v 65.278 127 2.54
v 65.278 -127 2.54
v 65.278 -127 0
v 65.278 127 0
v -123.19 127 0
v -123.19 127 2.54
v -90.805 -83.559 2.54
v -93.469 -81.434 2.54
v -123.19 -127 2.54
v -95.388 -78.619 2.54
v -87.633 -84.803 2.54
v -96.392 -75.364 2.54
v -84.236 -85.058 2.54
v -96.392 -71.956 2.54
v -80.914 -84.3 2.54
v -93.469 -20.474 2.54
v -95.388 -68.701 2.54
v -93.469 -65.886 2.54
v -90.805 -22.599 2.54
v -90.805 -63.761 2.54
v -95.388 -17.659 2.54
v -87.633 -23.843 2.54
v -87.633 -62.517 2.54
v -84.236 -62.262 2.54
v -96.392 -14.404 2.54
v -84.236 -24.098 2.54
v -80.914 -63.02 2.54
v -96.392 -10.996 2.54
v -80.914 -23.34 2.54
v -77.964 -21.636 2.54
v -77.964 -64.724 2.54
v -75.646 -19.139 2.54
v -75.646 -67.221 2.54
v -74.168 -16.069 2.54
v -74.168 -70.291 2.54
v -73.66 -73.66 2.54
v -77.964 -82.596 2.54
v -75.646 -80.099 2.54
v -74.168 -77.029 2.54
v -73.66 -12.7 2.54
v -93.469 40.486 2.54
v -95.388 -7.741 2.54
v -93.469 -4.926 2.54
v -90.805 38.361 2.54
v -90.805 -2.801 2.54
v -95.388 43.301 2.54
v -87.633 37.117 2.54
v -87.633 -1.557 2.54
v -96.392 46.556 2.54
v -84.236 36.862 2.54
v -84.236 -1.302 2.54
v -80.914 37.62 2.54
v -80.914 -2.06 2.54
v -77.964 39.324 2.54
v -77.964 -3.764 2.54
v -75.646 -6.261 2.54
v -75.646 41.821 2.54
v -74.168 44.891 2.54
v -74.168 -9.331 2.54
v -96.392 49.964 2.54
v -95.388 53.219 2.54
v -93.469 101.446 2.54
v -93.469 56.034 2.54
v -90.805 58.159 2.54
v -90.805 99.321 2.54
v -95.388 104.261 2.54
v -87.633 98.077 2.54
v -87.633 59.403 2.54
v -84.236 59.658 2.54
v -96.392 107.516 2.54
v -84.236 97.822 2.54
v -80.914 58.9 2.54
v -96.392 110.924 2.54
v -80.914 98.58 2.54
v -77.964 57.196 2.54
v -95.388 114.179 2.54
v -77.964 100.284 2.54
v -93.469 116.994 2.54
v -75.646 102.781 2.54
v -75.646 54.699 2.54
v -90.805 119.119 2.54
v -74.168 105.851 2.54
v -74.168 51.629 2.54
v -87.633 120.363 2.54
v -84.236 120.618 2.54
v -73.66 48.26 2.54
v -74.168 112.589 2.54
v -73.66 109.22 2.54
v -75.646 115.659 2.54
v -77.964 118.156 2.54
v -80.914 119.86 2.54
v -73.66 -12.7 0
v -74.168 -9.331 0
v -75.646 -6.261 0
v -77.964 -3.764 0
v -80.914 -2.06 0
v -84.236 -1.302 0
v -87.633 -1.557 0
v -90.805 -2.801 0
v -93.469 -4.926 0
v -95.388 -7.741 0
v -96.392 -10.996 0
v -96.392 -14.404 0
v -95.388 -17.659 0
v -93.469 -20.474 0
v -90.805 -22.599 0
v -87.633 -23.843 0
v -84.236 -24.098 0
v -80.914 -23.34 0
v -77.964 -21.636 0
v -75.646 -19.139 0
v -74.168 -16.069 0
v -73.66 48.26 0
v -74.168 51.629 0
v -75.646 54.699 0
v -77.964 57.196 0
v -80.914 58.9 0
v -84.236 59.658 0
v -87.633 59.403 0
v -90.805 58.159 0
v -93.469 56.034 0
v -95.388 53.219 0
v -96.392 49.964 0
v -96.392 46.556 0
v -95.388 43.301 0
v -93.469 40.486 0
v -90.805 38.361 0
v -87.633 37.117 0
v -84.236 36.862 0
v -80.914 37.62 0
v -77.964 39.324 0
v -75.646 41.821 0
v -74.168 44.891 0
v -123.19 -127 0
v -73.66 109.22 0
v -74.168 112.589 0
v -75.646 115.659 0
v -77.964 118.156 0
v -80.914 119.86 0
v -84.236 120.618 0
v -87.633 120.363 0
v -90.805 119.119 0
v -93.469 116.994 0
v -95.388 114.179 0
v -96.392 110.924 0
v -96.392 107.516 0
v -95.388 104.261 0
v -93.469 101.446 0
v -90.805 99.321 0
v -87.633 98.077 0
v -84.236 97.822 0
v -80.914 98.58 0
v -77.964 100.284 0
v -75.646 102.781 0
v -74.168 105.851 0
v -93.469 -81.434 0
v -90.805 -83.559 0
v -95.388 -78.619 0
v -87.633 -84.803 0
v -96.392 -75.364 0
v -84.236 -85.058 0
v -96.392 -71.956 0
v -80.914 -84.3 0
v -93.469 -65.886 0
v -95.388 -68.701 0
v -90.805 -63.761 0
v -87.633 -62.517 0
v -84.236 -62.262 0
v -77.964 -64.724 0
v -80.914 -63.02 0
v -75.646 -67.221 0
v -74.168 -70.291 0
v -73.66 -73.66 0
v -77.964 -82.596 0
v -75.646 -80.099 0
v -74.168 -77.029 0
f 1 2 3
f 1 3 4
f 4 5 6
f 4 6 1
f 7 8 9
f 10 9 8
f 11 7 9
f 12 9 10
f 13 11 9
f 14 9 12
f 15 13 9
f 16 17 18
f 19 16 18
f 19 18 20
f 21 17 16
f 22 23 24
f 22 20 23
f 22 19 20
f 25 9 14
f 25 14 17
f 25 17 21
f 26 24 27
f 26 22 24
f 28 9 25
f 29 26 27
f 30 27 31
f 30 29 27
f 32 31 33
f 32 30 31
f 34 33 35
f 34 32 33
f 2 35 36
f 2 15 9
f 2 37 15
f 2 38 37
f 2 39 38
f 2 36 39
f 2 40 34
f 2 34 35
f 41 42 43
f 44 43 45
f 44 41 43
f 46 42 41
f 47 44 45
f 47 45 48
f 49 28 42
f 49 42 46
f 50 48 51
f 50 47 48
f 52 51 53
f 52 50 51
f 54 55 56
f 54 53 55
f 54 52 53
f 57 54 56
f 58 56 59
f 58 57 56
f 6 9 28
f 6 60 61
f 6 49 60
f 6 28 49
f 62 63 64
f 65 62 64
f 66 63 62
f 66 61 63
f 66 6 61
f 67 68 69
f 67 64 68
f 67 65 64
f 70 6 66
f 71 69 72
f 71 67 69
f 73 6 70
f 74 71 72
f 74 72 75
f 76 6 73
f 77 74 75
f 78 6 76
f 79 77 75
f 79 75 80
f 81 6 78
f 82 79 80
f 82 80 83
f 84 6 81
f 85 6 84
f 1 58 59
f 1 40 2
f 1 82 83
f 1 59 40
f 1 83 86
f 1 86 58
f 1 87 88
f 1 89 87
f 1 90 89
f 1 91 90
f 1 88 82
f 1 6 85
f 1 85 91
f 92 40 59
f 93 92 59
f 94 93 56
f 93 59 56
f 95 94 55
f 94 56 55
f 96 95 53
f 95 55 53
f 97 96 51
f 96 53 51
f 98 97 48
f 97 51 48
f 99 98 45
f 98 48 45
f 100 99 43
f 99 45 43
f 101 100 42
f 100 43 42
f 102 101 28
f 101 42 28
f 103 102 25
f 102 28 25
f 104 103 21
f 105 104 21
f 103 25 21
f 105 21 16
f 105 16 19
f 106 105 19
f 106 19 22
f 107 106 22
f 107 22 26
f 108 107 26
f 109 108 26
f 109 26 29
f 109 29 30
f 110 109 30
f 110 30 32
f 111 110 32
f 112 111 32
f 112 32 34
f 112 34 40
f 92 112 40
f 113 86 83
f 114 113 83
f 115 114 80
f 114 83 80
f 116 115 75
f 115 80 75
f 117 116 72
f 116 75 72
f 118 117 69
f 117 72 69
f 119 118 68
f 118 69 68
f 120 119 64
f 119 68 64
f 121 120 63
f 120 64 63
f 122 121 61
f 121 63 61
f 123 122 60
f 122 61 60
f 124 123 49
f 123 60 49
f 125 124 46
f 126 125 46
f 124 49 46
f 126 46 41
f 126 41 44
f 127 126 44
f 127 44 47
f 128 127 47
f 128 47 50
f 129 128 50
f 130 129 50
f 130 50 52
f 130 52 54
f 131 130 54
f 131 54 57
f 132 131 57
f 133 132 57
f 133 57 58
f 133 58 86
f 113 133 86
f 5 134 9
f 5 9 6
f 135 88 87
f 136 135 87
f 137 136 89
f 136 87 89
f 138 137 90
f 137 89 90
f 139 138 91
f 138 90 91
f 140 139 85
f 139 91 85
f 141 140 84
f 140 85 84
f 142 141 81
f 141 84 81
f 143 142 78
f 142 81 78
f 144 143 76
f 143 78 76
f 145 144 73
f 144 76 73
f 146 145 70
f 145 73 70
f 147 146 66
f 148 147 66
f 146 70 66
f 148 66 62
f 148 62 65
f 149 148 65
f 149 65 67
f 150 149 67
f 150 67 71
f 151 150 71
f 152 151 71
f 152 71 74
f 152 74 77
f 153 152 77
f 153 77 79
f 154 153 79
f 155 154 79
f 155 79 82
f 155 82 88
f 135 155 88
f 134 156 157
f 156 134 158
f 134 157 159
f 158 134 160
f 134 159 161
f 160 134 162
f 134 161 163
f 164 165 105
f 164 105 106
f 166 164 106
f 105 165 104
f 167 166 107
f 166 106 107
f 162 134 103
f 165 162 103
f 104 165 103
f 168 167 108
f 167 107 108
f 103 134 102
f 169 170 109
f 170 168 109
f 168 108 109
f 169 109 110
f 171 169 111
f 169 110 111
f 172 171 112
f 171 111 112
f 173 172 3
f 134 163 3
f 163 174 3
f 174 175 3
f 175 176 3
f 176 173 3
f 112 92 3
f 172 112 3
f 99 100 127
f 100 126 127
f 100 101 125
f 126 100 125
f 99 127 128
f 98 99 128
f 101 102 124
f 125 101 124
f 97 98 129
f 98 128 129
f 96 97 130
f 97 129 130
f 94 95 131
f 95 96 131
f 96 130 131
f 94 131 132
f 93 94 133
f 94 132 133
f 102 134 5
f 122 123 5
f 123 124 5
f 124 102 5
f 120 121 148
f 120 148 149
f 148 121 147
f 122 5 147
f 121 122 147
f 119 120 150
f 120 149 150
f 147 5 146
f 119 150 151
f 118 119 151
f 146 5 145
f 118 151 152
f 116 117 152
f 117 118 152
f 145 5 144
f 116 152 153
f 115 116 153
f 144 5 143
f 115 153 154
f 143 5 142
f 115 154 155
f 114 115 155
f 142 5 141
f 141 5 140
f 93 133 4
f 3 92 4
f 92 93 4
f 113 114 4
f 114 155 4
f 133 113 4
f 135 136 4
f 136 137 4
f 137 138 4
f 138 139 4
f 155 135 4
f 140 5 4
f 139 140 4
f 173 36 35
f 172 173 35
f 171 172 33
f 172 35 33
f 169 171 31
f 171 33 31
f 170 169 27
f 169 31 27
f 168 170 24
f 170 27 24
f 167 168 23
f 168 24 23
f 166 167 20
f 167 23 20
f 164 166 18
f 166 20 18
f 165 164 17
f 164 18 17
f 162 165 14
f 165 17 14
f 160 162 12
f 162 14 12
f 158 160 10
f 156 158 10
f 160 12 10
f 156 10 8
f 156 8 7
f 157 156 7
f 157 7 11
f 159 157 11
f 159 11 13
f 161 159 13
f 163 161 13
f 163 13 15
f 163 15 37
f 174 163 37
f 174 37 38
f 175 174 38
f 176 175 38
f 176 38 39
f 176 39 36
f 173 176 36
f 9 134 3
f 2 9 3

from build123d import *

# Parameters (mm, degrees)
SKETCH1_W           = 246.38
SKETCH1_H           = 254
BOSS_EXTRUDE1_DEPTH = 2.54
SKETCH3_R           = 11.43
CUT_EXTRUDE1_DEPTH  = 3.54
LPATTERN1_COUNT     = 4
LPATTERN1_PITCH     = 60.96
SKETCH4_W           = 57.912
SKETCH4_H           = 254
CUT_EXTRUDE2_DEPTH  = 3.54


with BuildPart() as part:
    # Sketch1 → Boss-Extrude1 (new body)
    with BuildSketch(Plane.XY):
        Rectangle(SKETCH1_W, SKETCH1_H)
    extrude(amount=BOSS_EXTRUDE1_DEPTH)

    # Sketch3 → Cut-Extrude1 (cut, through all)
    with BuildSketch(Plane.XY.offset(2.54)):
        with Locations((-85.09, 109.22)):
            Circle(SKETCH3_R)
    cut_extrude1 = extrude(amount=-CUT_EXTRUDE1_DEPTH, mode=Mode.SUBTRACT)

    # LPattern1: Cut-Extrude1 ×4
    with Locations(*[(0, -i * LPATTERN1_PITCH, 0) for i in range(1, LPATTERN1_COUNT)]):
        add(cut_extrude1, mode=Mode.SUBTRACT)

    # Sketch4 → Cut-Extrude2 (cut, through all)
    with BuildSketch(Plane.XY.offset(2.54)):
        with Locations((94.234, 0)):
            Rectangle(SKETCH4_W, SKETCH4_H)
    extrude(amount=-CUT_EXTRUDE2_DEPTH, mode=Mode.SUBTRACT)


solid = part.part
